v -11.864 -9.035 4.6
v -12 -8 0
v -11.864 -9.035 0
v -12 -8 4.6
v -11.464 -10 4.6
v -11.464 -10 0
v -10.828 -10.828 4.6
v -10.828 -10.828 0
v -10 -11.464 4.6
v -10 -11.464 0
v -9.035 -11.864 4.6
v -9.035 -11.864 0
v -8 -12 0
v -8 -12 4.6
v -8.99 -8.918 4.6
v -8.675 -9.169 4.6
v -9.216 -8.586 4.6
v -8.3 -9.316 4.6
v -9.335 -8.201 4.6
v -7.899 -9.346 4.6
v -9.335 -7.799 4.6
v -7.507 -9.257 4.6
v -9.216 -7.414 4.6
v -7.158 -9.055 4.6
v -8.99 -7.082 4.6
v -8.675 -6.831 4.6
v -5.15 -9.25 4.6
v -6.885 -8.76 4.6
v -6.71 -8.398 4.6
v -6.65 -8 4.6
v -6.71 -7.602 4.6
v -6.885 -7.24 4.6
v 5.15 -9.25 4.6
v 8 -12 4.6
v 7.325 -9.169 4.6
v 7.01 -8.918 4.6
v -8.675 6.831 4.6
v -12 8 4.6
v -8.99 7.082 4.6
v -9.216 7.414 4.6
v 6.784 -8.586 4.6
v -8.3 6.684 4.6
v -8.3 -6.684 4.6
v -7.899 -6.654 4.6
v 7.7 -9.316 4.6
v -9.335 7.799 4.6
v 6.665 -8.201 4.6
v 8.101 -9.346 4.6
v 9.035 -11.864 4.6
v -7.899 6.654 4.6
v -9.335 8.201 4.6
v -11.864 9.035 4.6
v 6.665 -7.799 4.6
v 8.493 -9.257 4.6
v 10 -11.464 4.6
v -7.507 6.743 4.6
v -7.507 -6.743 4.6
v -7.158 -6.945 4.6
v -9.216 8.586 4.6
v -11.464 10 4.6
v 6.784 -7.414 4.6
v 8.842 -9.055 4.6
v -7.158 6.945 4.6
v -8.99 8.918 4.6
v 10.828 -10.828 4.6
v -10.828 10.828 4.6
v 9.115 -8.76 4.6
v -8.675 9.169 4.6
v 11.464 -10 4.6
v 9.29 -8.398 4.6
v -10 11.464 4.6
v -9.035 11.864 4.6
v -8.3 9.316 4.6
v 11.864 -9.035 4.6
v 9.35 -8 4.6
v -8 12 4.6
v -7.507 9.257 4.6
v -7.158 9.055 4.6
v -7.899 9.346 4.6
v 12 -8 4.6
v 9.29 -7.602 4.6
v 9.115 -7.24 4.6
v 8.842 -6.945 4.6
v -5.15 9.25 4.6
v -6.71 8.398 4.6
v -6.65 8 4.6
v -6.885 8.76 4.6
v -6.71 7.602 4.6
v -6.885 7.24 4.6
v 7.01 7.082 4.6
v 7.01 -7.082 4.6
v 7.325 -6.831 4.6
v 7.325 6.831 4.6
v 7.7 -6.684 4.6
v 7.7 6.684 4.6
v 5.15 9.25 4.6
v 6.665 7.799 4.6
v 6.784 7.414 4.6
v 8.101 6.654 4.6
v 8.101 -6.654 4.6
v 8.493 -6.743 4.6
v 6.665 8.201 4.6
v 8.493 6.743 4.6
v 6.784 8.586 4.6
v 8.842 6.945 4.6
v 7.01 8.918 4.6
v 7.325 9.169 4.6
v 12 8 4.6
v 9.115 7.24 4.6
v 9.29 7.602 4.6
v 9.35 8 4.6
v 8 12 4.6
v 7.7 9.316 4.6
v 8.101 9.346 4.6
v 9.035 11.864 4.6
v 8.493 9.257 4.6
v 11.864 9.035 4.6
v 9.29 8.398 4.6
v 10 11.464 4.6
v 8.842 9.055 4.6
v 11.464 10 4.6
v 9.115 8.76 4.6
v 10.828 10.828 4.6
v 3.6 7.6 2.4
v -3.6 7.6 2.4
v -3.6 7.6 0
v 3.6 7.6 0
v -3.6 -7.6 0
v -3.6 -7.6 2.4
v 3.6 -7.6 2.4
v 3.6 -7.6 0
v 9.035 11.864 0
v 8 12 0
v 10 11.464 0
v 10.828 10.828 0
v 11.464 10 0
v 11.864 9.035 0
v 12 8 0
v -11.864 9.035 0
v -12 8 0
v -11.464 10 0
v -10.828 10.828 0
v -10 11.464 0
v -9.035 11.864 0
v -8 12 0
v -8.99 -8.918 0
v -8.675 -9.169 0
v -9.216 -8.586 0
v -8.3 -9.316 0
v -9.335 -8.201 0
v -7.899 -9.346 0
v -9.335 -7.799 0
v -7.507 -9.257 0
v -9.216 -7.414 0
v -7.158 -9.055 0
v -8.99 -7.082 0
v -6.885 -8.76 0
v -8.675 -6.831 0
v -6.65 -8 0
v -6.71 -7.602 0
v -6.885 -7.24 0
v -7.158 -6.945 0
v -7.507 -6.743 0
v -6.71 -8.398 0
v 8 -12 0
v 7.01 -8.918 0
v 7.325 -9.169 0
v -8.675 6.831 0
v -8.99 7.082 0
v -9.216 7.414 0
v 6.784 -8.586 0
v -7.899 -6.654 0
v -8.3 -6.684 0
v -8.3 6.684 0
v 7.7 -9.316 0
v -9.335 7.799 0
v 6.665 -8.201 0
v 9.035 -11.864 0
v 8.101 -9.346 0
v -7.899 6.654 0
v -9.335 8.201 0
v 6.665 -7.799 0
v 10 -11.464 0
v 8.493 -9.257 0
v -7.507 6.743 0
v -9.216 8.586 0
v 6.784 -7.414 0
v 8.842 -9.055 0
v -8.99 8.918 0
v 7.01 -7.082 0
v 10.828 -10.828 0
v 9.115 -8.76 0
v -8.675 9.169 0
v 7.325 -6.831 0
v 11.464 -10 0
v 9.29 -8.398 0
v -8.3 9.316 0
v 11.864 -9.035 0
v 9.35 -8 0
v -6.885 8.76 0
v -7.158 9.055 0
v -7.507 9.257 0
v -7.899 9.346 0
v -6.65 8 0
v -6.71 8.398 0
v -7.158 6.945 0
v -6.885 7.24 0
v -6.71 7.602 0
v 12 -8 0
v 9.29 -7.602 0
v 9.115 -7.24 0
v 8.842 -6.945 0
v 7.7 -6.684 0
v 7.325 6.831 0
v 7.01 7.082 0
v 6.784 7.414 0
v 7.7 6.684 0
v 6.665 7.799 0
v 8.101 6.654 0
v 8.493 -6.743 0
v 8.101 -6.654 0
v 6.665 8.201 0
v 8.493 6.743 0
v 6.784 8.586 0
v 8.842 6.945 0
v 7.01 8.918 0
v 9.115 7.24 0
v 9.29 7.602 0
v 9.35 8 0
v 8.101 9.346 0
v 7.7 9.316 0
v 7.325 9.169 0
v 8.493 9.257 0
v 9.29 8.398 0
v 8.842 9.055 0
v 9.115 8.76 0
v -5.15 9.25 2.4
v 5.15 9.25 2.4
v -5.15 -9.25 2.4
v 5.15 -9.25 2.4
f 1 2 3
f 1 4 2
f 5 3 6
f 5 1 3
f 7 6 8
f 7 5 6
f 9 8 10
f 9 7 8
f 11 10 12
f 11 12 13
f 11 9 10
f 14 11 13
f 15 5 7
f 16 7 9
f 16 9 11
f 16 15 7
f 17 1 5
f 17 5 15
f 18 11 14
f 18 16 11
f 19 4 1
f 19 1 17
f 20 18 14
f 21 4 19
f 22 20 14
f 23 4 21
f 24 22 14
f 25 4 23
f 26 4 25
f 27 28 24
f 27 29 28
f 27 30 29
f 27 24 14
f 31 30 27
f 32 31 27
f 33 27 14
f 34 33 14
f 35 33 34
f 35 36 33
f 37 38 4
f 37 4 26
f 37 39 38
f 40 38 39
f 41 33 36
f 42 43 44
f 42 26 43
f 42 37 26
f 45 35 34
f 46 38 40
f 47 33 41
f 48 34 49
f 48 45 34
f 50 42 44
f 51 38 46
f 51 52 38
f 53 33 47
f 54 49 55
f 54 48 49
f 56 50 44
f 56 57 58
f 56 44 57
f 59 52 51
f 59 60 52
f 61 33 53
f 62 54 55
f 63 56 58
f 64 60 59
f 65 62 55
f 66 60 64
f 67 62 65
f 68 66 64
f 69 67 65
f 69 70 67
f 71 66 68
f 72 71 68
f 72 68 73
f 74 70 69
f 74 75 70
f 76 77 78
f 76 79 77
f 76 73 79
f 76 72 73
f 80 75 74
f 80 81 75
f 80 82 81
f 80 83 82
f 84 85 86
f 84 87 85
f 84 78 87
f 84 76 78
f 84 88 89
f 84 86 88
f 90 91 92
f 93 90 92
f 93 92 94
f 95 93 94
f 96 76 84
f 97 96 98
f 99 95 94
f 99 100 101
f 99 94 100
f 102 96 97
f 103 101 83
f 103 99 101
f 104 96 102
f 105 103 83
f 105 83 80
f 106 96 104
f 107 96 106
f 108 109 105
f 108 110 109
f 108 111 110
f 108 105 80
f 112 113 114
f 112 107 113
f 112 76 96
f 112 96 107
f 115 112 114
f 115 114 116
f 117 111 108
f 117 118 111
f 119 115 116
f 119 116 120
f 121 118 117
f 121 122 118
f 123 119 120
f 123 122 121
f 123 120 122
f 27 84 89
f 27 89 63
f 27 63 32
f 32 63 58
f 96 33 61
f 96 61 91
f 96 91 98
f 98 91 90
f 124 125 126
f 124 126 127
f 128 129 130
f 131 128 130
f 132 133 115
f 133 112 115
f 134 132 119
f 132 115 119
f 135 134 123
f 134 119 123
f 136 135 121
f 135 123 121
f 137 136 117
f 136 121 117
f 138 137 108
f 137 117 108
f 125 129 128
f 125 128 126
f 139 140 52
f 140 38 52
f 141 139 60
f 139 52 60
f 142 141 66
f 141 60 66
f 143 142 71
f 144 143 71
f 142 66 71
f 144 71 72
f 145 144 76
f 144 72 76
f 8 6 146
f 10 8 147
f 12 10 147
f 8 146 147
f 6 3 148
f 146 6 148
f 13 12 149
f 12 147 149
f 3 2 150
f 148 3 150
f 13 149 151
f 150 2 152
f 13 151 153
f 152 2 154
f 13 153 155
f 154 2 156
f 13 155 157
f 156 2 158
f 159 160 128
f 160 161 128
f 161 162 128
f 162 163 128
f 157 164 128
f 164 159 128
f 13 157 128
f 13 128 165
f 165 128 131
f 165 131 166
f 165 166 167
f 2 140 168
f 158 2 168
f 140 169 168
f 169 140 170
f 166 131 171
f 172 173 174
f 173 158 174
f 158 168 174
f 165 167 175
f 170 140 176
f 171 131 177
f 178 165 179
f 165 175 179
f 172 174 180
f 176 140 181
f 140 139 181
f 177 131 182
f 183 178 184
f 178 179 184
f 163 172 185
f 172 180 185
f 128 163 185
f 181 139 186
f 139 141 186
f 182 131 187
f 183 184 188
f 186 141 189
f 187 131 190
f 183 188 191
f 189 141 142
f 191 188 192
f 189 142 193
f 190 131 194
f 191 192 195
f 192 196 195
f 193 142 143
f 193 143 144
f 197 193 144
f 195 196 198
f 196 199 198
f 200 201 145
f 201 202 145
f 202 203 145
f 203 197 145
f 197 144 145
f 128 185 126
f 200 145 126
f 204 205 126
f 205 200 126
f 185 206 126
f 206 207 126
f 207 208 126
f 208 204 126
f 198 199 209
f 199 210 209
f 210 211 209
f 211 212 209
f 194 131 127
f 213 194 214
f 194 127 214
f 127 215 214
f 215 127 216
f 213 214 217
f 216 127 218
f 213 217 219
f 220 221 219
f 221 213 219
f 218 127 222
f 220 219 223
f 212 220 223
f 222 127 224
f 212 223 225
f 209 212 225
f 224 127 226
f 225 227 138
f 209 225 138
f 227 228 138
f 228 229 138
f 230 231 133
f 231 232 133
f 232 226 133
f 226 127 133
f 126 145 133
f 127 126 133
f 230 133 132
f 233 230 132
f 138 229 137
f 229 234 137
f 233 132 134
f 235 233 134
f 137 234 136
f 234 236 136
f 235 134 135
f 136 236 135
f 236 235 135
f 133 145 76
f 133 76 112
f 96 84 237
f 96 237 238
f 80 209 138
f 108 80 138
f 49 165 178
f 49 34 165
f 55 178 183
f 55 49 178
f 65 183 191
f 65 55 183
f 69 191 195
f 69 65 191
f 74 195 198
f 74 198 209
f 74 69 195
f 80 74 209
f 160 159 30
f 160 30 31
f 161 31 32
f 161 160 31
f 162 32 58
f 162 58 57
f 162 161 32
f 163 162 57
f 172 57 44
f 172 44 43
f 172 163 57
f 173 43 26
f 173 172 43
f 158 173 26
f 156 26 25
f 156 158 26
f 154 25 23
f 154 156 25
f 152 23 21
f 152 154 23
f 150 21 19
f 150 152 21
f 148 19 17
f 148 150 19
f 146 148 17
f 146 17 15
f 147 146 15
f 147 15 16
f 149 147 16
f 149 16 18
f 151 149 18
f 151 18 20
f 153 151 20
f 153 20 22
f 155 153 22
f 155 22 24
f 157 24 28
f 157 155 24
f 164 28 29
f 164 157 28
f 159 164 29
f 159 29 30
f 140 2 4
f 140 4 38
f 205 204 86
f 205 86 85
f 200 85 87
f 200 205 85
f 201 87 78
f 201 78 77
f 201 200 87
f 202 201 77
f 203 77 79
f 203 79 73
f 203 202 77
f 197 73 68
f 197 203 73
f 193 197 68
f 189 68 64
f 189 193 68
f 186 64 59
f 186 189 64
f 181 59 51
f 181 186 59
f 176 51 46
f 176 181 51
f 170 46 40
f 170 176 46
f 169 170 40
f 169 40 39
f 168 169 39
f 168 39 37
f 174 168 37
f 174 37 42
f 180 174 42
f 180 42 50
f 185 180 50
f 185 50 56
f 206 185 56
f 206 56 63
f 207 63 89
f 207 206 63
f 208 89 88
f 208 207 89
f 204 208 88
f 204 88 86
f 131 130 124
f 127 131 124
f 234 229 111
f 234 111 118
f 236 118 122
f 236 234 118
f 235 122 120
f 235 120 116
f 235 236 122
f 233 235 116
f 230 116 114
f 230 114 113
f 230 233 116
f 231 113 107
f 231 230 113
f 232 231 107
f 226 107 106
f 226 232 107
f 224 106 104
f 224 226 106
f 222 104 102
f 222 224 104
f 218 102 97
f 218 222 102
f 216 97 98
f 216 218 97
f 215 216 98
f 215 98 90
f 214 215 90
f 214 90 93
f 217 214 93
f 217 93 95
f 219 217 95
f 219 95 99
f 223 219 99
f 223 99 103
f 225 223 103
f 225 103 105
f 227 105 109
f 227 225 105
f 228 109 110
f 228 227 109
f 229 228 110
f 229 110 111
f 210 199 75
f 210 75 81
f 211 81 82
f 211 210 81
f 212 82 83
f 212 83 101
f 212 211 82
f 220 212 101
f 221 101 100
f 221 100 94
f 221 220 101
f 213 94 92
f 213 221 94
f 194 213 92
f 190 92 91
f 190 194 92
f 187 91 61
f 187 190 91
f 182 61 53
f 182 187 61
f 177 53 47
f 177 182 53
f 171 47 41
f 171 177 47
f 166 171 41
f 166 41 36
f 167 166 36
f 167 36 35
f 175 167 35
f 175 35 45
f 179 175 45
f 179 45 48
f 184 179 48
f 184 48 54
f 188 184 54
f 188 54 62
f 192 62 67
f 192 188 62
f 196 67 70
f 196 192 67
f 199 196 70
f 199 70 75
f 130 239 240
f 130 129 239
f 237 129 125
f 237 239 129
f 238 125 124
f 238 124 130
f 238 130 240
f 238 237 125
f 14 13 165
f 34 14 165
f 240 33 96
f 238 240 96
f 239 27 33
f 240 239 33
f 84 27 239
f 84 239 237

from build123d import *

# Parameters (mm, degrees)
F0_W     = 24
F0_H     = 24
F0_R     = 1.35
F1_DEPTH = 4.6
F2_W     = 7.2
F2_H     = 15.2
F3_DEPTH = 4.601
F2_W_2   = 10.3
F2_H_2   = 18.5
F4_DEPTH = 2.2
F5_R     = 4


with BuildPart() as f1:
    # F0 (on Top) → F1 (new body)
    with BuildSketch(Plane.XY):
        Rectangle(F0_W, F0_H)
        with Locations((-8, -8)):
            Circle(F0_R, mode=Mode.SUBTRACT)
        with Locations((8, -8)):
            Circle(F0_R, mode=Mode.SUBTRACT)
        with Locations((-8, 8)):
            Circle(F0_R, mode=Mode.SUBTRACT)
        with Locations((8, 8)):
            Circle(F0_R, mode=Mode.SUBTRACT)
    extrude(amount=F1_DEPTH)

    # F2 (on face) → F3 (cut, through all)
    with BuildSketch(Plane.XY.offset(4.6)):
        Rectangle(F2_W, F2_H)
    extrude(amount=-F3_DEPTH, mode=Mode.SUBTRACT)

    # F2 (on face) → F4 (cut)
    with BuildSketch(Plane.XY.offset(4.6)):
        Rectangle(F2_W_2, F2_H_2)
        Rectangle(F2_W, F2_H, mode=Mode.SUBTRACT)
    extrude(amount=-F4_DEPTH, mode=Mode.SUBTRACT)

    # F5
    f5_edges = [f1.edges().sort_by_distance(p)[0] for p in [
        (-12, 12, 2.3),
        (12, 12, 2.3),
        (12, -12, 2.3),
        (-12, -12, 2.3),
    ]]
    fillet(f5_edges, radius=F5_R)


solid = f1.part
